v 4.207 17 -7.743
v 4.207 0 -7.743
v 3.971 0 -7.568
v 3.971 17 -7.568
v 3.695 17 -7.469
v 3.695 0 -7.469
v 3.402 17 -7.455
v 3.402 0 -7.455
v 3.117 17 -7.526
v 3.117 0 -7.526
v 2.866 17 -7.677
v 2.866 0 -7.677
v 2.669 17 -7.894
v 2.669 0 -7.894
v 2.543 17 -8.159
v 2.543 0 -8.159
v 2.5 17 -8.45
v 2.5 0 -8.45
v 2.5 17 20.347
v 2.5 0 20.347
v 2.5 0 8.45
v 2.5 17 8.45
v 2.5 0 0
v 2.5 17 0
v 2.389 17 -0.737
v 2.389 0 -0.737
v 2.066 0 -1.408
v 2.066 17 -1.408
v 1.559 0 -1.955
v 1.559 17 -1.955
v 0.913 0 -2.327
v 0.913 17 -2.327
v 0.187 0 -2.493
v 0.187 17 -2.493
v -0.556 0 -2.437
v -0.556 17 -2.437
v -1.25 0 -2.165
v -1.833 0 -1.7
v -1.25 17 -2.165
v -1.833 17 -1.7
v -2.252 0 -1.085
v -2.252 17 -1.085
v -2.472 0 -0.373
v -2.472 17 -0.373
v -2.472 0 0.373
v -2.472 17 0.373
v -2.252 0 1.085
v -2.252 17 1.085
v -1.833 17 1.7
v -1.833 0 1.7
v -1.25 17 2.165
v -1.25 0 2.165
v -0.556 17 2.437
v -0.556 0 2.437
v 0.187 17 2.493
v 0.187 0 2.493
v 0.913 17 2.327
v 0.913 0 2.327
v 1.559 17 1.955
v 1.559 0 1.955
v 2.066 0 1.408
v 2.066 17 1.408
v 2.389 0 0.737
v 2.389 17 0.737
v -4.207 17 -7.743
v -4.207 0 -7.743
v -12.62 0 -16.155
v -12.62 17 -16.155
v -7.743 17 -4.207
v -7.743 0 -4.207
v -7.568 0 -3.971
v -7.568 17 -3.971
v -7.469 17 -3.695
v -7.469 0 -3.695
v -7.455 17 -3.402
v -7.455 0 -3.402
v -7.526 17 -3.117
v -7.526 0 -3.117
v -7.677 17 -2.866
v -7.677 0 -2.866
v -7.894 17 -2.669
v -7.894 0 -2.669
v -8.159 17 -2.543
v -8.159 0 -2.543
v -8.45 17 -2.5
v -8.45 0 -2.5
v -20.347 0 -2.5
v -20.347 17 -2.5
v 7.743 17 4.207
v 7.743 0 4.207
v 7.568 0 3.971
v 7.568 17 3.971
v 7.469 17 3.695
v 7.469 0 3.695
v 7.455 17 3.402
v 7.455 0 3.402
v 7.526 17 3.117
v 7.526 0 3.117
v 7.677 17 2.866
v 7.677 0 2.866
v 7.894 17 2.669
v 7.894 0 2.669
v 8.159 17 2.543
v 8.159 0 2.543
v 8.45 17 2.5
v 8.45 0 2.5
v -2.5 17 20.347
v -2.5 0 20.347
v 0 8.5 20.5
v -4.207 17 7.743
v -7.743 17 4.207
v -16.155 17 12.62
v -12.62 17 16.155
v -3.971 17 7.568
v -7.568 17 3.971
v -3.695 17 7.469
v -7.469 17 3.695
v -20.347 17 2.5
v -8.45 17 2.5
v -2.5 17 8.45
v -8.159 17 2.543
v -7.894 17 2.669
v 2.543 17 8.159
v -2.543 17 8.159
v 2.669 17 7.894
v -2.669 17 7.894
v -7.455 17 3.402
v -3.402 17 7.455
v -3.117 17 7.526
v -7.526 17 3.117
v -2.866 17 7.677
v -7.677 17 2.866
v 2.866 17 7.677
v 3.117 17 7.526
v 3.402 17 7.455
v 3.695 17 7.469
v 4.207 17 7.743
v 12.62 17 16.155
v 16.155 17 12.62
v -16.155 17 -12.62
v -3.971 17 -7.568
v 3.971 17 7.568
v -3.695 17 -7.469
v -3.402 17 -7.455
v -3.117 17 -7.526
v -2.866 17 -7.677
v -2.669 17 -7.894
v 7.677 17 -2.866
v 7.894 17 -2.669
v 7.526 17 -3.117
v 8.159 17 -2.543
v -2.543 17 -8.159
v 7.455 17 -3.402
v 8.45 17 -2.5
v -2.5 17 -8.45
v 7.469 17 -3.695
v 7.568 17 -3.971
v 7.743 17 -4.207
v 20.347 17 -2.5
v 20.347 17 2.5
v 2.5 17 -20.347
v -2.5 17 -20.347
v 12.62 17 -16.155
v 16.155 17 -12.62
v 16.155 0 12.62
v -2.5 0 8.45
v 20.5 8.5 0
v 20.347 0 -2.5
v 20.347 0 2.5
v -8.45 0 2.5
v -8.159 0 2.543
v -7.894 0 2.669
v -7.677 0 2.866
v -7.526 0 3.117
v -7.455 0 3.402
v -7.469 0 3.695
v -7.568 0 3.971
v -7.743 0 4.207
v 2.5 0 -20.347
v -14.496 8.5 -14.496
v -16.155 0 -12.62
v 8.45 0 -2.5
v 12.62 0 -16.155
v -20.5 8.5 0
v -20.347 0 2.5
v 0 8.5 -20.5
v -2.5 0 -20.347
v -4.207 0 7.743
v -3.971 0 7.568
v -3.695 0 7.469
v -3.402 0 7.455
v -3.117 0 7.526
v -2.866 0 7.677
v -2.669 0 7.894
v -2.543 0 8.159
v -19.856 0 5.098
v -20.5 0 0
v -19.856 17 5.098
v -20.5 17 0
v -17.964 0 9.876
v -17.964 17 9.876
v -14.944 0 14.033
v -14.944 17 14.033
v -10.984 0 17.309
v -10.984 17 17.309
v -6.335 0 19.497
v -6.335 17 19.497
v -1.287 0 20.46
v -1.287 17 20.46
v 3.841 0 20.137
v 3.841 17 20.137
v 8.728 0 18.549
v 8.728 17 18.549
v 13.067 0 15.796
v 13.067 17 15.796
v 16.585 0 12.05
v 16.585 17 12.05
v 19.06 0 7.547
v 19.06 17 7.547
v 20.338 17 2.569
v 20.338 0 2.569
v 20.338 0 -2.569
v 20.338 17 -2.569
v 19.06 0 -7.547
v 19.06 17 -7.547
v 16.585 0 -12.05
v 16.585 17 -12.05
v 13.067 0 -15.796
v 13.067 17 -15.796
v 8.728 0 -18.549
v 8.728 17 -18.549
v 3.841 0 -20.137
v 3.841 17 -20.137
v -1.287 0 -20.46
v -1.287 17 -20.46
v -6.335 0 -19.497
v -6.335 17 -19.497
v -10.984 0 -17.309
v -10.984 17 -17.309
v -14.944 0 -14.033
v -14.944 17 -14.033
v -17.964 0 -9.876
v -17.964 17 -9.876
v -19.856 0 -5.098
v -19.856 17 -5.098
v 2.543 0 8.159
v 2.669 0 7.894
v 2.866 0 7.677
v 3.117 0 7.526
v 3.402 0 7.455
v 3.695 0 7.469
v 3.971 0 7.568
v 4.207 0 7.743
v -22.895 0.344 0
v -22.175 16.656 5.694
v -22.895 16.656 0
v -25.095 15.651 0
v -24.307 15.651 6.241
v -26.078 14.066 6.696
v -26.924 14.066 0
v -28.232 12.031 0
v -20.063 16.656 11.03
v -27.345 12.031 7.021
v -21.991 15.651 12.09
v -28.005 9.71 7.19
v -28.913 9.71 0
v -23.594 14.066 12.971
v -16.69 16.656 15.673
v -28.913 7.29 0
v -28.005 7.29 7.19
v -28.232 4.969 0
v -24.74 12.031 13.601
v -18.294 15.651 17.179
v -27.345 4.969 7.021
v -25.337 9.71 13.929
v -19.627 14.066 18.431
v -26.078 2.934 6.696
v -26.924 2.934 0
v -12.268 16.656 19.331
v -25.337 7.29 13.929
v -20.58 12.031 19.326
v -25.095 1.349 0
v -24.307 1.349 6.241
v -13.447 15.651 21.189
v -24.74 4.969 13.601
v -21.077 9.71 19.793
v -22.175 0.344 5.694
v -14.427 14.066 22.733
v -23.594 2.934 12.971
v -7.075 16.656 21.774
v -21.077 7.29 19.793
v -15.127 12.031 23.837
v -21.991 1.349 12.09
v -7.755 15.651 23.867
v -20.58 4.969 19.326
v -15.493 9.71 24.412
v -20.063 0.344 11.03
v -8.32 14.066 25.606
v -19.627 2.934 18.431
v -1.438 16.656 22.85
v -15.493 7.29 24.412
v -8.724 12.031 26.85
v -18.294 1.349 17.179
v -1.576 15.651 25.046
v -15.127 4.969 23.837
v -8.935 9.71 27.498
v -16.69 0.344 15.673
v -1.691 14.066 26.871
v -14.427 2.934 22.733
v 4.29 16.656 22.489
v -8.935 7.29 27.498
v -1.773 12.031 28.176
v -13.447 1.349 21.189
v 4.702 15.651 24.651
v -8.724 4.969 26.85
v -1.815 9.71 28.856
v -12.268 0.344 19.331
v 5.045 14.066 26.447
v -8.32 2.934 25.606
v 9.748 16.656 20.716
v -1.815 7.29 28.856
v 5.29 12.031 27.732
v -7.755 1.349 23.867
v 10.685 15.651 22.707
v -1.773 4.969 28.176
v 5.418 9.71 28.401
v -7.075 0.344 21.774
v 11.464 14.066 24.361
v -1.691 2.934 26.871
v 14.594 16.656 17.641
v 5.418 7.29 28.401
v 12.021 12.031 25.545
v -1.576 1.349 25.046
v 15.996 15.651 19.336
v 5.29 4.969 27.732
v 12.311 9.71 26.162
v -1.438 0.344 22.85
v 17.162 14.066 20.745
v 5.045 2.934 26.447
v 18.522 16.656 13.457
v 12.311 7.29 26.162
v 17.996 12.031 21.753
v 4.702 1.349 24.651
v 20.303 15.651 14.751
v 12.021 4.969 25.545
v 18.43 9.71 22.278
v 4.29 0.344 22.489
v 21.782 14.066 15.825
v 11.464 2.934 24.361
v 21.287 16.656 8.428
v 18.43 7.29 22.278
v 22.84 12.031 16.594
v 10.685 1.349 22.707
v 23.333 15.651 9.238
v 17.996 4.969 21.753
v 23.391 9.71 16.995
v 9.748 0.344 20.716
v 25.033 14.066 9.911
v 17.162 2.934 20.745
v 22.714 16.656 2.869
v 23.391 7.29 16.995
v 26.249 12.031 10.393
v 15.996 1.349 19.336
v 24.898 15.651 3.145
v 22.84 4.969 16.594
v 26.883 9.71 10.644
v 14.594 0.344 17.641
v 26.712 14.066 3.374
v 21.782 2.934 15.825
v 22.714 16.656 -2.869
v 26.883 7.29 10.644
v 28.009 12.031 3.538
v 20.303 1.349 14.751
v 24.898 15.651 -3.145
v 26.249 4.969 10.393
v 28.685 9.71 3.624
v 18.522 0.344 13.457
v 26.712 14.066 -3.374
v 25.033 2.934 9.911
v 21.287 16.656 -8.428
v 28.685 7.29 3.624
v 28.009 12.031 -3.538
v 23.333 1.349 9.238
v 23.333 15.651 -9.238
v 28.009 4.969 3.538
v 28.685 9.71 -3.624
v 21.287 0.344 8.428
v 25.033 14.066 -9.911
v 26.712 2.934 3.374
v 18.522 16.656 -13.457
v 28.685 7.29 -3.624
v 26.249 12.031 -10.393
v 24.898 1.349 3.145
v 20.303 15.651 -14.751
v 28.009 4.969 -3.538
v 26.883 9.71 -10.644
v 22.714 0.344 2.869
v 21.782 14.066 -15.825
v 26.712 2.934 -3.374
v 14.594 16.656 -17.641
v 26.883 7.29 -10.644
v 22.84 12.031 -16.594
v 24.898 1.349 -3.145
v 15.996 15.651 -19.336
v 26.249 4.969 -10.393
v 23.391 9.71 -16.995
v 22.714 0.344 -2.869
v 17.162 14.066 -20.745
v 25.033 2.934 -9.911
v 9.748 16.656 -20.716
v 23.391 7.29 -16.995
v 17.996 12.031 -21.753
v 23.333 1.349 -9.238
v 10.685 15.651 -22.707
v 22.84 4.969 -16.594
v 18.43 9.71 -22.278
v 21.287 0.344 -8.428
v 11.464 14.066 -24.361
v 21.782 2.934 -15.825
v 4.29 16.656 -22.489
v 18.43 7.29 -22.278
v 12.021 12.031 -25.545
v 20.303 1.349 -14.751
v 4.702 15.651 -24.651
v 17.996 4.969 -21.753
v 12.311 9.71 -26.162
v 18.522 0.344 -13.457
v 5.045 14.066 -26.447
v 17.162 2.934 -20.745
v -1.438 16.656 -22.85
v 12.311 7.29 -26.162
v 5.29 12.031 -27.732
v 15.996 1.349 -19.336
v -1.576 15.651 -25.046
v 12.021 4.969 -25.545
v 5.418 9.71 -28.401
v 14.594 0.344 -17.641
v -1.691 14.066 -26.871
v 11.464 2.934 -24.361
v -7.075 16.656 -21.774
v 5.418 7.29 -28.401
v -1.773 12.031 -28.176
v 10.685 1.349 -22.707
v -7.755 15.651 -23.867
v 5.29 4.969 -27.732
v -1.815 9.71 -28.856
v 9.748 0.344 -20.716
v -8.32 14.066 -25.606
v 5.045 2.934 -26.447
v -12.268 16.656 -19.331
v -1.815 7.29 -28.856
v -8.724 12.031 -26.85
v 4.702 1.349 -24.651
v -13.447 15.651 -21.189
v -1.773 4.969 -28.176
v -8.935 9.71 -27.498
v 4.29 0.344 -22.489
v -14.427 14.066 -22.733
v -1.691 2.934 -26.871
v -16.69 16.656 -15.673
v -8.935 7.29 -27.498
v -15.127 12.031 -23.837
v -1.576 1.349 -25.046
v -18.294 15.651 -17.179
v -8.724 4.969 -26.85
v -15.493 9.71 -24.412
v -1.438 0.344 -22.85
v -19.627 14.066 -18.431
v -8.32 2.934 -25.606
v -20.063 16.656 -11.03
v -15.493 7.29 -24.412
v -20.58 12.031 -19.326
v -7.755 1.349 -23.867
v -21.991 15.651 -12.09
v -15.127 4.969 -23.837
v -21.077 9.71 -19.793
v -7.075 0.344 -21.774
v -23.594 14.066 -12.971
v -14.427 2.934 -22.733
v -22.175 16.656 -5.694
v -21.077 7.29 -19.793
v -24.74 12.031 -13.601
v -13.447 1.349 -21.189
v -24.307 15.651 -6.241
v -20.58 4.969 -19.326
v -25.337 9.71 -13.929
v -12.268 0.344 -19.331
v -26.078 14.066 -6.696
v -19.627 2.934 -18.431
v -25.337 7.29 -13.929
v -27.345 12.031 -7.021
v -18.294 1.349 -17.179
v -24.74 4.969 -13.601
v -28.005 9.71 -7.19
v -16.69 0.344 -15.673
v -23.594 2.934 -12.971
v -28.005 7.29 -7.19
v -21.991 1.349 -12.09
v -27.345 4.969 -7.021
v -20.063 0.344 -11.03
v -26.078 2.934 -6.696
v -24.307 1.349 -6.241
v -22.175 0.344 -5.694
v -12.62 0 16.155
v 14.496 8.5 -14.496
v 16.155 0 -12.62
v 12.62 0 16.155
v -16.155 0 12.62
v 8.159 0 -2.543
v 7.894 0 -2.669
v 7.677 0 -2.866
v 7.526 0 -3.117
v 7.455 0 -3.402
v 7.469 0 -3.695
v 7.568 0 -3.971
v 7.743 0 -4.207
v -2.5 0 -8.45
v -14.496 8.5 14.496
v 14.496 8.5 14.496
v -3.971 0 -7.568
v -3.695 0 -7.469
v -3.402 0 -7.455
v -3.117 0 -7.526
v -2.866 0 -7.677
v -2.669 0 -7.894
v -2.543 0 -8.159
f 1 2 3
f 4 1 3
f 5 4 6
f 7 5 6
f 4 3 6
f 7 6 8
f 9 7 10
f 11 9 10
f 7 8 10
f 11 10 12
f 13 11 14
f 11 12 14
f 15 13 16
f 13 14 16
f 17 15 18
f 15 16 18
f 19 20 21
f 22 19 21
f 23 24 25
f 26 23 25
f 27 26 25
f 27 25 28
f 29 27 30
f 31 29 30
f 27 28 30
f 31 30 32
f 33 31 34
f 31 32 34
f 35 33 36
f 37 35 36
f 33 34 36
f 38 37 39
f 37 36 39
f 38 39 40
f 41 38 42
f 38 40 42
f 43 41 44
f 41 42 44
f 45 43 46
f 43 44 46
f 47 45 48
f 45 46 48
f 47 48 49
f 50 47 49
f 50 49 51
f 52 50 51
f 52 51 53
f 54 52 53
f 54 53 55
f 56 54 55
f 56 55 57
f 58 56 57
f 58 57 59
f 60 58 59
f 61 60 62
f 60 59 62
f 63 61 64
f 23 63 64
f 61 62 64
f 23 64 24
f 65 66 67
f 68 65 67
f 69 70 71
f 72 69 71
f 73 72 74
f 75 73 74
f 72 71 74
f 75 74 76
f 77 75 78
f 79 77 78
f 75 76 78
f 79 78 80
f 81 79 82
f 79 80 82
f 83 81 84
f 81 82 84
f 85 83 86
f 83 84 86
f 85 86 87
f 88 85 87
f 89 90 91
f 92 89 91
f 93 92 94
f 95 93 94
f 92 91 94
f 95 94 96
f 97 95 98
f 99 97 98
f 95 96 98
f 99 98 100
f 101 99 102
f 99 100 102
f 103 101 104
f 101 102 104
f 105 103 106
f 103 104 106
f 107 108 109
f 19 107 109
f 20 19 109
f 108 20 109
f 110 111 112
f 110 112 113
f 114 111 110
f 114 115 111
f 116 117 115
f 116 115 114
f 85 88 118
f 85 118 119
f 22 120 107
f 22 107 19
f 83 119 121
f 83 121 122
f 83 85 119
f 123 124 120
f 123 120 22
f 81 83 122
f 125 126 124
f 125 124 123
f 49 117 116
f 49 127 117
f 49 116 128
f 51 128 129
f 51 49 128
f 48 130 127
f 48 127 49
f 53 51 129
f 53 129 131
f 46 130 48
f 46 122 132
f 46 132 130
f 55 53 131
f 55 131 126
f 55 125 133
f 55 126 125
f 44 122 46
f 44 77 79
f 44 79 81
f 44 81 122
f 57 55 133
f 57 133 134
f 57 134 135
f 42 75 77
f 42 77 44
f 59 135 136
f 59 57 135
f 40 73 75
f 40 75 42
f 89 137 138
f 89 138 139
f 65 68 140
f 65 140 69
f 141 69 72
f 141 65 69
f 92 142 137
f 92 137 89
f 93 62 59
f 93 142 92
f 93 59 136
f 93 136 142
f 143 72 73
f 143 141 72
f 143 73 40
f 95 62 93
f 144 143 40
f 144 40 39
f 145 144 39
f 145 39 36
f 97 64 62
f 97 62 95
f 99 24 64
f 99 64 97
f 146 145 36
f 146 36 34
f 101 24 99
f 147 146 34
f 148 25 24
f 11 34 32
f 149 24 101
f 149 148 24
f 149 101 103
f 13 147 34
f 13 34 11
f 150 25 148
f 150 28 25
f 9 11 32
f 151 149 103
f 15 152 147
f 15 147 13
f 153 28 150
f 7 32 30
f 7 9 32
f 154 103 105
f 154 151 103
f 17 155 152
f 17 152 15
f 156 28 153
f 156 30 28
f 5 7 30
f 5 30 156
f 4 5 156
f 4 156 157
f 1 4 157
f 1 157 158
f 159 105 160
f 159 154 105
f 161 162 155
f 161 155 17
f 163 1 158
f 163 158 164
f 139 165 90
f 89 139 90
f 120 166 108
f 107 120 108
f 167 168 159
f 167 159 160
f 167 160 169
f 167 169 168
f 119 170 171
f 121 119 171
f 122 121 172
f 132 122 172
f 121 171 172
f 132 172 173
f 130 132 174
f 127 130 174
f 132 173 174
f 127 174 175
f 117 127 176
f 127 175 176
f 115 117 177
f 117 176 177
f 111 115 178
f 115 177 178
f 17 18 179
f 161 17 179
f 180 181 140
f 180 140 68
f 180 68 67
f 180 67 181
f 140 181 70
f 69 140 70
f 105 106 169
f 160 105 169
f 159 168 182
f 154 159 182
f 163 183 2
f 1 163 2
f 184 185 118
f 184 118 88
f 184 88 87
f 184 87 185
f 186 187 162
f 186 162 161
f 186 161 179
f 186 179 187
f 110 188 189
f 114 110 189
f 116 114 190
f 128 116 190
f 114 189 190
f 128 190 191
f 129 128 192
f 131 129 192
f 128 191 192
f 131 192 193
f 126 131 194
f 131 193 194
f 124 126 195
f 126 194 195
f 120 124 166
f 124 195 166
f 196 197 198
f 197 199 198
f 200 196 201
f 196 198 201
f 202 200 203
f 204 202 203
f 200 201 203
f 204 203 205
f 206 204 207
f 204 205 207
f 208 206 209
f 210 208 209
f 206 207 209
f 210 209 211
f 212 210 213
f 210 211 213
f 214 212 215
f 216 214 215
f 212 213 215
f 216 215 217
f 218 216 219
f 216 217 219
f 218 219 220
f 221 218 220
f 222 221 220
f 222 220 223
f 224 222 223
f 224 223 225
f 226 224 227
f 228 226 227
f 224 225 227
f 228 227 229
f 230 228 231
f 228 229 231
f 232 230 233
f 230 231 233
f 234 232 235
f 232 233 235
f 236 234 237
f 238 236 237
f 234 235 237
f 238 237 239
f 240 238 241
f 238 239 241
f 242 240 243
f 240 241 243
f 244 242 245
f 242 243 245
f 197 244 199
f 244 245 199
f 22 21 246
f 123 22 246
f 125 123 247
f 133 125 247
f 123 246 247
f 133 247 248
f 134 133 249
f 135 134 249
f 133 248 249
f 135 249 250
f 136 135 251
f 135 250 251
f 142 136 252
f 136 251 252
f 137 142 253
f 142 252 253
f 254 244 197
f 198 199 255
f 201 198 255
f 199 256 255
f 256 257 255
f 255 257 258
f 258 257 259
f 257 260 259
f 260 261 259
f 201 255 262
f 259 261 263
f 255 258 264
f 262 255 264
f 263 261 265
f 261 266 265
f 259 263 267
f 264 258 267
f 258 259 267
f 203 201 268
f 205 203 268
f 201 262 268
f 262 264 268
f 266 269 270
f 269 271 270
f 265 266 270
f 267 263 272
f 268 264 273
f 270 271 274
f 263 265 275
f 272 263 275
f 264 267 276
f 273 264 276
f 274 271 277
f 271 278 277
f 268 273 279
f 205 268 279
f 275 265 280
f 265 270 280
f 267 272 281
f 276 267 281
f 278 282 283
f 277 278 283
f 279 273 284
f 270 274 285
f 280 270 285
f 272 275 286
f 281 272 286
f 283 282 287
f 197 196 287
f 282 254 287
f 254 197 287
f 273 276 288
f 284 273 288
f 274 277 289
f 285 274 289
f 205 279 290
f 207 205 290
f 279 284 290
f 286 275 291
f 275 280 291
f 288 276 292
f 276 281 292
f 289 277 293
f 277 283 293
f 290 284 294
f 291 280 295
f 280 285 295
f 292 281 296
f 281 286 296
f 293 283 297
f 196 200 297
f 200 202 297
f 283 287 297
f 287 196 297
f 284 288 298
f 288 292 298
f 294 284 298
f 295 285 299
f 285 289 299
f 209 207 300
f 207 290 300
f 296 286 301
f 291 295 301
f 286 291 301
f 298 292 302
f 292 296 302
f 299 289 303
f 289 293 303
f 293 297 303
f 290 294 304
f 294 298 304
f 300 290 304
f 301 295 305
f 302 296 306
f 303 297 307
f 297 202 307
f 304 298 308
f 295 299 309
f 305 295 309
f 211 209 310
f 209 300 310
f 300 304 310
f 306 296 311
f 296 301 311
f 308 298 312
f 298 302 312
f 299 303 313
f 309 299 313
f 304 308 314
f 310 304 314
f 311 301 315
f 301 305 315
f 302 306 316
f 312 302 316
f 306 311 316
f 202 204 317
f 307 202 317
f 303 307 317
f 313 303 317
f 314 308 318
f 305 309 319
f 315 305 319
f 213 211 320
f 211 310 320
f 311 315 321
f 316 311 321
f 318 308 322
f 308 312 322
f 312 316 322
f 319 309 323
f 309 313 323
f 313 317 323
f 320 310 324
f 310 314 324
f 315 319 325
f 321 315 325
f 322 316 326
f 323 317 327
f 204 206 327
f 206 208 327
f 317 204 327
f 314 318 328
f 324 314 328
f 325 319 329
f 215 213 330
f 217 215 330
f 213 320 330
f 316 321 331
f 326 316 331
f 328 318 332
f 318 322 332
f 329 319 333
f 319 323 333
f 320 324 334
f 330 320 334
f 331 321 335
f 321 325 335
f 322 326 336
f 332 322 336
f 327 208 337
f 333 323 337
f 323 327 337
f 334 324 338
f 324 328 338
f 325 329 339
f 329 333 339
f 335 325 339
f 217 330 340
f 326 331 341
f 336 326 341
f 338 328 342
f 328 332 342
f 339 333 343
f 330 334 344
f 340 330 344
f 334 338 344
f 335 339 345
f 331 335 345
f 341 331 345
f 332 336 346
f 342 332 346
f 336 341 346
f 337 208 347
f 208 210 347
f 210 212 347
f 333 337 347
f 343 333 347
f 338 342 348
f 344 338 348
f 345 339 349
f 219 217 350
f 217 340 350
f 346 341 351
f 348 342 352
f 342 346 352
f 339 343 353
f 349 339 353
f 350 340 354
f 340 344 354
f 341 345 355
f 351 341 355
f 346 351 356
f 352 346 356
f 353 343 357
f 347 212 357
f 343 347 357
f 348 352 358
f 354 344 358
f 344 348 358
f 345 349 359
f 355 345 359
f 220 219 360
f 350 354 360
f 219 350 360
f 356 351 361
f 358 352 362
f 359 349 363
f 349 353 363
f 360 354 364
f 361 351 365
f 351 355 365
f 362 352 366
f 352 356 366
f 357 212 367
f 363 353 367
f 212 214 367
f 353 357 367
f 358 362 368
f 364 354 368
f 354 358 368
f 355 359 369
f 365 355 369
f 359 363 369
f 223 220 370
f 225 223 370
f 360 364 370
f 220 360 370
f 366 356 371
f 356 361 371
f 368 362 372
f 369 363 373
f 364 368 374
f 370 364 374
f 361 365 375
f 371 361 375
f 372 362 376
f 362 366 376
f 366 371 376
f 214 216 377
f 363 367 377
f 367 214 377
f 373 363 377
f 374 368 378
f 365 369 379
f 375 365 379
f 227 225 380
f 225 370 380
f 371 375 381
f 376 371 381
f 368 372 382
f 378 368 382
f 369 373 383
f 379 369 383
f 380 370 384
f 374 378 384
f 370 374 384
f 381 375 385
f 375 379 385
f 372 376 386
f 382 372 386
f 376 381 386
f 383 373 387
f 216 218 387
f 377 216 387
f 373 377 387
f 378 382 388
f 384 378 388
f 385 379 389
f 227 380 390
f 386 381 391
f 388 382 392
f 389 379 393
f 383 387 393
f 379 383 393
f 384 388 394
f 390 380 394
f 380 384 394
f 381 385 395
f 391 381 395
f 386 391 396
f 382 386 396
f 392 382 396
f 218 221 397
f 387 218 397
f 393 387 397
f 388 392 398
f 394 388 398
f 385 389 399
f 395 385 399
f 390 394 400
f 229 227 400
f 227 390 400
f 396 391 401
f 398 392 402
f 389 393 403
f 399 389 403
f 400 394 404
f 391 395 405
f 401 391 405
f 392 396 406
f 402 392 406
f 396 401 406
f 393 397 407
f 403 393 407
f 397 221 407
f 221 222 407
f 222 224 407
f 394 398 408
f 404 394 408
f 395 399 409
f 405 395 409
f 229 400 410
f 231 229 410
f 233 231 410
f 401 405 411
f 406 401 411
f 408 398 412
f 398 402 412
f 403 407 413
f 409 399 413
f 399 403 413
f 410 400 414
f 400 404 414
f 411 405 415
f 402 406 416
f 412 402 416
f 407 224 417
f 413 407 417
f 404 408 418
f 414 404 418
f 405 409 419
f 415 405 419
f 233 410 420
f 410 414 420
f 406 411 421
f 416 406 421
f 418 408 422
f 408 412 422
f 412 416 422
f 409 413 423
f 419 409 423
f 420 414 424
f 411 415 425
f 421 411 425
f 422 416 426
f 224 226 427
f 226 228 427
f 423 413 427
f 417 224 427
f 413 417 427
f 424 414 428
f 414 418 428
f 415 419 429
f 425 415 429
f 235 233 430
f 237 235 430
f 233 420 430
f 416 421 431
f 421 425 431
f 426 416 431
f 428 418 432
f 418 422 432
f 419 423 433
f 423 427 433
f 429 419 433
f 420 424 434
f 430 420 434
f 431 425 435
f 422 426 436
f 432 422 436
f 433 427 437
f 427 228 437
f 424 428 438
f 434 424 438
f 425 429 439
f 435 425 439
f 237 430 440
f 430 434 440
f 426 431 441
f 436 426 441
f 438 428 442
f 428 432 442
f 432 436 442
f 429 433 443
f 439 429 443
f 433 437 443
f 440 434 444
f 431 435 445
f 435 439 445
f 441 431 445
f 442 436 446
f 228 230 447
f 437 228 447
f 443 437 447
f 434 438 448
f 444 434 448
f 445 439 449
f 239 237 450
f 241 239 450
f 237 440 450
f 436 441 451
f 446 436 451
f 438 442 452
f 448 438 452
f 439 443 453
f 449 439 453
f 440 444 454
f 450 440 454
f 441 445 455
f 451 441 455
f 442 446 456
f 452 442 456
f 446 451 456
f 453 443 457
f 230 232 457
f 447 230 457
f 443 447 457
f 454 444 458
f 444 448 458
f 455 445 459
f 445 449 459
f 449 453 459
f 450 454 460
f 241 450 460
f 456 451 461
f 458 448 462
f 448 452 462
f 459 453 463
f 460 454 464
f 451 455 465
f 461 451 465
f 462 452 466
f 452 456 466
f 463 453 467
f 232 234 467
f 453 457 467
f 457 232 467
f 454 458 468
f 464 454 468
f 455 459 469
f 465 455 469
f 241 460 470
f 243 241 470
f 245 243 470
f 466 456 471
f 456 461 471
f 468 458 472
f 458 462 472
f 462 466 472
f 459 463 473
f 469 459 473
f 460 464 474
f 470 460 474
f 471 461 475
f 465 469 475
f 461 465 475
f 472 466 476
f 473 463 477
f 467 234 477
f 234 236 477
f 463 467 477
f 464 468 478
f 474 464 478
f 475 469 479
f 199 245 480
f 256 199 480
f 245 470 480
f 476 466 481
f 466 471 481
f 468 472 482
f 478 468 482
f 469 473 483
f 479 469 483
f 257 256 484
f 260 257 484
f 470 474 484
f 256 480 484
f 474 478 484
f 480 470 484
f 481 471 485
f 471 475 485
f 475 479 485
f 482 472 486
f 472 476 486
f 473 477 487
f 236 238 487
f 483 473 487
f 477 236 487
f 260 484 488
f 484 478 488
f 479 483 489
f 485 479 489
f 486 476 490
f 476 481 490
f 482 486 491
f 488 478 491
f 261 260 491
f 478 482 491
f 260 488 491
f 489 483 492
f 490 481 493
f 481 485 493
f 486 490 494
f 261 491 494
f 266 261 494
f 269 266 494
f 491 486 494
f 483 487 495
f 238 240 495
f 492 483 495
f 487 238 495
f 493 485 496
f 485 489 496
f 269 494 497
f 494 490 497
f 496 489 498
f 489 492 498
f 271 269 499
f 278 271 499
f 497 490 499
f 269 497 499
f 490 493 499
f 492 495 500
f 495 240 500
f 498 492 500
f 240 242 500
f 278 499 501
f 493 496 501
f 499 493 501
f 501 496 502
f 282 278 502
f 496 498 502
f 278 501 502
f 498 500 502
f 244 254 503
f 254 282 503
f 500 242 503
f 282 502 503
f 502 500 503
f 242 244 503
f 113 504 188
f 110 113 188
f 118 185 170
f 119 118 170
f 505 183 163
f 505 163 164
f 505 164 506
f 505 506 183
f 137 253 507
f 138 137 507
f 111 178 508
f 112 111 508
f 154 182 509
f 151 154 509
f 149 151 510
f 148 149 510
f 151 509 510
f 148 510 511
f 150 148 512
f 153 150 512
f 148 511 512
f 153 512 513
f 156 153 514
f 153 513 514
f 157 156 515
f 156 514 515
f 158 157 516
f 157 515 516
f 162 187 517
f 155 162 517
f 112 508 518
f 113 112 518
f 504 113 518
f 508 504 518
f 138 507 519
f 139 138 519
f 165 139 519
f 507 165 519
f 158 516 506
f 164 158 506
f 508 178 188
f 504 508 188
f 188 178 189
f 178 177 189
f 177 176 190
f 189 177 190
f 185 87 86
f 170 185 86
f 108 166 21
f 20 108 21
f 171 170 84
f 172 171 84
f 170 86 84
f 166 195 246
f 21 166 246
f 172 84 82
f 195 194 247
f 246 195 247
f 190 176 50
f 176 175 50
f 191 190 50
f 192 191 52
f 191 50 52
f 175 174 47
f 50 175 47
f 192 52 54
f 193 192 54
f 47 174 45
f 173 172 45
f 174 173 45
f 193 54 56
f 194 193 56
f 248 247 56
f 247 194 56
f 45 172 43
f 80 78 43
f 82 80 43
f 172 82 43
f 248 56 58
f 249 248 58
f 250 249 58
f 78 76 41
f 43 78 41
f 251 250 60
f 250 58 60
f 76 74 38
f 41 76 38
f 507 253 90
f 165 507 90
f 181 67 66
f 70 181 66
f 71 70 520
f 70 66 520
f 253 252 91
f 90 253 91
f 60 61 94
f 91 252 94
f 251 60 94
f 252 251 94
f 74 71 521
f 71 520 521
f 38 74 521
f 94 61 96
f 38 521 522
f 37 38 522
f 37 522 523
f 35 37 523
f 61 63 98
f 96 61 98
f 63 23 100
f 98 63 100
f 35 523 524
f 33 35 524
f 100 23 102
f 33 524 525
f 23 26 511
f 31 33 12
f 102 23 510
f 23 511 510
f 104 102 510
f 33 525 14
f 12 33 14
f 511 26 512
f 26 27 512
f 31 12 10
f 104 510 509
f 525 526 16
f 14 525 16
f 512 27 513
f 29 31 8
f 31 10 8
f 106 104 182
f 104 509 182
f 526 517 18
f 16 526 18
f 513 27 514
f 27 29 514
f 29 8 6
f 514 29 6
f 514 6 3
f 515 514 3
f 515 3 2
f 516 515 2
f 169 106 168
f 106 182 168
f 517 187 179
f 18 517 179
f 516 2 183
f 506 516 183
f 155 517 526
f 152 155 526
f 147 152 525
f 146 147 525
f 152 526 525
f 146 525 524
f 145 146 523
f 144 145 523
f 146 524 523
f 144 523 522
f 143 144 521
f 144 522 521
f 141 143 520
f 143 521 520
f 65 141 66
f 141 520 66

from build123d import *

# Parameters (mm, degrees)
SKETCH2_R           = 7
SKETCH2_R_2         = 2.5
BOSS_EXTRUDE1_DEPTH = 17
BOSS_EXTRUDE2_DEPTH = 17
SKETCH4_R           = 2.5
CUT_EXTRUDE1_DEPTH  = 17


with BuildPart() as part:
    # Sketch1 → Revolve1 (revolve)
    with BuildSketch(Plane.XY):
        with BuildLine():
            Line((-20.5, 0), (-20.5, 17))
            ThreePointArc((-20.5, 17), (-29, 8.5), (-20.5, 0))
        make_face()
    revolve(axis=Axis((0, -19.40997101, 0), (0, 1, 0)))


with BuildPart() as body_2:
    # Sketch2 → Boss-Extrude1 (new body)
    with BuildSketch(Plane(origin=(0, 0, 0), x_dir=(1, 0, 0), z_dir=(0, 1, 0))):
        Circle(SKETCH2_R)
        Circle(SKETCH2_R_2, mode=Mode.SUBTRACT)
    extrude(amount=BOSS_EXTRUDE1_DEPTH)

    # Sketch3 → Boss-Extrude2 (add)
    with BuildSketch(Plane(origin=(0, 0, 0), x_dir=(1, 0, 0), z_dir=(0, 1, 0))):
        with BuildLine():
            Line((-2.5, 20.346989949), (-2.5, 8.449747468))
            ThreePointArc((-2.5, 8.449747468), (-3.117316568, 7.525867936), (-4.207106781, 7.742640687))
            Line((-4.207106781, 7.742640687), (-12.619727617, 16.155261523))
            add(Edge.make_bspline(
                [(-16.155261523, 12.619727617), (-14.603883459, 14.603883459), (-12.619727617, 16.155261523)],
                knots=[0, 0, 0, 1, 1, 1], degree=2))
            Line((-16.155261523, 12.619727617), (-7.742640687, 4.207106781))
            ThreePointArc((-7.742640687, 4.207106781), (-7.525867936, 3.117316568), (-8.449747468, 2.5))
            Line((-8.449747468, 2.5), (-20.346989949, 2.5))
            add(Edge.make_bspline(
                [(-20.346989949, -2.5), (-20.653010051, 0), (-20.346989949, 2.5)],
                knots=[0, 0, 0, 1, 1, 1], degree=2))
            Line((-20.346989949, -2.5), (-8.449747468, -2.5))
            ThreePointArc((-8.449747468, -2.5), (-7.525867936, -3.117316568), (-7.742640687, -4.207106781))
            Line((-7.742640687, -4.207106781), (-16.155261523, -12.619727617))
            add(Edge.make_bspline(
                [(-16.155261523, -12.619727617), (-14.603883459, -14.603883459), (-12.619727617, -16.155261523)],
                knots=[0, 0, 0, 1, 1, 1], degree=2))
            Line((-12.619727617, -16.155261523), (-4.207106781, -7.742640687))
            ThreePointArc((-4.207106781, -7.742640687), (-3.117316568, -7.525867936), (-2.5, -8.449747468))
            Line((-2.5, -8.449747468), (-2.5, -20.346989949))
            add(Edge.make_bspline(
                [(-2.5, -20.346989949), (0, -20.653010051), (2.5, -20.346989949)],
                knots=[0, 0, 0, 1, 1, 1], degree=2))
            Line((2.5, -20.346989949), (2.5, -8.449747468))
            ThreePointArc((2.5, -8.449747468), (3.117316568, -7.525867936), (4.207106781, -7.742640687))
            Line((4.207106781, -7.742640687), (12.619727617, -16.155261523))
            add(Edge.make_bspline(
                [(12.619727617, -16.155261523), (14.603883459, -14.603883459), (16.155261523, -12.619727617)],
                knots=[0, 0, 0, 1, 1, 1], degree=2))
            Line((16.155261523, -12.619727617), (7.742640687, -4.207106781))
            ThreePointArc((7.742640687, -4.207106781), (7.525867936, -3.117316568), (8.449747468, -2.5))
            Line((8.449747468, -2.5), (20.346989949, -2.5))
            add(Edge.make_bspline(
                [(20.346989949, 2.5), (20.653010051, 0), (20.346989949, -2.5)],
                knots=[0, 0, 0, 1, 1, 1], degree=2))
            Line((20.346989949, 2.5), (8.449747468, 2.5))
            ThreePointArc((8.449747468, 2.5), (7.525867936, 3.117316568), (7.742640687, 4.207106781))
            Line((7.742640687, 4.207106781), (16.155261523, 12.619727617))
            add(Edge.make_bspline(
                [(12.619727617, 16.155261523), (14.603883459, 14.603883459), (16.155261523, 12.619727617)],
                knots=[0, 0, 0, 1, 1, 1], degree=2))
            Line((12.619727617, 16.155261523), (4.207106781, 7.742640687))
            ThreePointArc((4.207106781, 7.742640687), (3.117316568, 7.525867936), (2.5, 8.449747468))
            Line((2.5, 8.449747468), (2.5, 20.346989949))
            add(Edge.make_bspline(
                [(-2.5, 20.346989949), (0, 20.653010051), (2.5, 20.346989949)],
                knots=[0, 0, 0, 1, 1, 1], degree=2))
        make_face()
    extrude(amount=BOSS_EXTRUDE2_DEPTH)

    # Sketch4 → Cut-Extrude1 (cut)
    with BuildSketch(Plane(origin=(0, 17, 0), x_dir=(1, 0, 0), z_dir=(0, 1, 0))):
        Circle(SKETCH4_R)
    extrude(amount=-CUT_EXTRUDE1_DEPTH, mode=Mode.SUBTRACT)


solid = Compound([part.part, body_2.part])
